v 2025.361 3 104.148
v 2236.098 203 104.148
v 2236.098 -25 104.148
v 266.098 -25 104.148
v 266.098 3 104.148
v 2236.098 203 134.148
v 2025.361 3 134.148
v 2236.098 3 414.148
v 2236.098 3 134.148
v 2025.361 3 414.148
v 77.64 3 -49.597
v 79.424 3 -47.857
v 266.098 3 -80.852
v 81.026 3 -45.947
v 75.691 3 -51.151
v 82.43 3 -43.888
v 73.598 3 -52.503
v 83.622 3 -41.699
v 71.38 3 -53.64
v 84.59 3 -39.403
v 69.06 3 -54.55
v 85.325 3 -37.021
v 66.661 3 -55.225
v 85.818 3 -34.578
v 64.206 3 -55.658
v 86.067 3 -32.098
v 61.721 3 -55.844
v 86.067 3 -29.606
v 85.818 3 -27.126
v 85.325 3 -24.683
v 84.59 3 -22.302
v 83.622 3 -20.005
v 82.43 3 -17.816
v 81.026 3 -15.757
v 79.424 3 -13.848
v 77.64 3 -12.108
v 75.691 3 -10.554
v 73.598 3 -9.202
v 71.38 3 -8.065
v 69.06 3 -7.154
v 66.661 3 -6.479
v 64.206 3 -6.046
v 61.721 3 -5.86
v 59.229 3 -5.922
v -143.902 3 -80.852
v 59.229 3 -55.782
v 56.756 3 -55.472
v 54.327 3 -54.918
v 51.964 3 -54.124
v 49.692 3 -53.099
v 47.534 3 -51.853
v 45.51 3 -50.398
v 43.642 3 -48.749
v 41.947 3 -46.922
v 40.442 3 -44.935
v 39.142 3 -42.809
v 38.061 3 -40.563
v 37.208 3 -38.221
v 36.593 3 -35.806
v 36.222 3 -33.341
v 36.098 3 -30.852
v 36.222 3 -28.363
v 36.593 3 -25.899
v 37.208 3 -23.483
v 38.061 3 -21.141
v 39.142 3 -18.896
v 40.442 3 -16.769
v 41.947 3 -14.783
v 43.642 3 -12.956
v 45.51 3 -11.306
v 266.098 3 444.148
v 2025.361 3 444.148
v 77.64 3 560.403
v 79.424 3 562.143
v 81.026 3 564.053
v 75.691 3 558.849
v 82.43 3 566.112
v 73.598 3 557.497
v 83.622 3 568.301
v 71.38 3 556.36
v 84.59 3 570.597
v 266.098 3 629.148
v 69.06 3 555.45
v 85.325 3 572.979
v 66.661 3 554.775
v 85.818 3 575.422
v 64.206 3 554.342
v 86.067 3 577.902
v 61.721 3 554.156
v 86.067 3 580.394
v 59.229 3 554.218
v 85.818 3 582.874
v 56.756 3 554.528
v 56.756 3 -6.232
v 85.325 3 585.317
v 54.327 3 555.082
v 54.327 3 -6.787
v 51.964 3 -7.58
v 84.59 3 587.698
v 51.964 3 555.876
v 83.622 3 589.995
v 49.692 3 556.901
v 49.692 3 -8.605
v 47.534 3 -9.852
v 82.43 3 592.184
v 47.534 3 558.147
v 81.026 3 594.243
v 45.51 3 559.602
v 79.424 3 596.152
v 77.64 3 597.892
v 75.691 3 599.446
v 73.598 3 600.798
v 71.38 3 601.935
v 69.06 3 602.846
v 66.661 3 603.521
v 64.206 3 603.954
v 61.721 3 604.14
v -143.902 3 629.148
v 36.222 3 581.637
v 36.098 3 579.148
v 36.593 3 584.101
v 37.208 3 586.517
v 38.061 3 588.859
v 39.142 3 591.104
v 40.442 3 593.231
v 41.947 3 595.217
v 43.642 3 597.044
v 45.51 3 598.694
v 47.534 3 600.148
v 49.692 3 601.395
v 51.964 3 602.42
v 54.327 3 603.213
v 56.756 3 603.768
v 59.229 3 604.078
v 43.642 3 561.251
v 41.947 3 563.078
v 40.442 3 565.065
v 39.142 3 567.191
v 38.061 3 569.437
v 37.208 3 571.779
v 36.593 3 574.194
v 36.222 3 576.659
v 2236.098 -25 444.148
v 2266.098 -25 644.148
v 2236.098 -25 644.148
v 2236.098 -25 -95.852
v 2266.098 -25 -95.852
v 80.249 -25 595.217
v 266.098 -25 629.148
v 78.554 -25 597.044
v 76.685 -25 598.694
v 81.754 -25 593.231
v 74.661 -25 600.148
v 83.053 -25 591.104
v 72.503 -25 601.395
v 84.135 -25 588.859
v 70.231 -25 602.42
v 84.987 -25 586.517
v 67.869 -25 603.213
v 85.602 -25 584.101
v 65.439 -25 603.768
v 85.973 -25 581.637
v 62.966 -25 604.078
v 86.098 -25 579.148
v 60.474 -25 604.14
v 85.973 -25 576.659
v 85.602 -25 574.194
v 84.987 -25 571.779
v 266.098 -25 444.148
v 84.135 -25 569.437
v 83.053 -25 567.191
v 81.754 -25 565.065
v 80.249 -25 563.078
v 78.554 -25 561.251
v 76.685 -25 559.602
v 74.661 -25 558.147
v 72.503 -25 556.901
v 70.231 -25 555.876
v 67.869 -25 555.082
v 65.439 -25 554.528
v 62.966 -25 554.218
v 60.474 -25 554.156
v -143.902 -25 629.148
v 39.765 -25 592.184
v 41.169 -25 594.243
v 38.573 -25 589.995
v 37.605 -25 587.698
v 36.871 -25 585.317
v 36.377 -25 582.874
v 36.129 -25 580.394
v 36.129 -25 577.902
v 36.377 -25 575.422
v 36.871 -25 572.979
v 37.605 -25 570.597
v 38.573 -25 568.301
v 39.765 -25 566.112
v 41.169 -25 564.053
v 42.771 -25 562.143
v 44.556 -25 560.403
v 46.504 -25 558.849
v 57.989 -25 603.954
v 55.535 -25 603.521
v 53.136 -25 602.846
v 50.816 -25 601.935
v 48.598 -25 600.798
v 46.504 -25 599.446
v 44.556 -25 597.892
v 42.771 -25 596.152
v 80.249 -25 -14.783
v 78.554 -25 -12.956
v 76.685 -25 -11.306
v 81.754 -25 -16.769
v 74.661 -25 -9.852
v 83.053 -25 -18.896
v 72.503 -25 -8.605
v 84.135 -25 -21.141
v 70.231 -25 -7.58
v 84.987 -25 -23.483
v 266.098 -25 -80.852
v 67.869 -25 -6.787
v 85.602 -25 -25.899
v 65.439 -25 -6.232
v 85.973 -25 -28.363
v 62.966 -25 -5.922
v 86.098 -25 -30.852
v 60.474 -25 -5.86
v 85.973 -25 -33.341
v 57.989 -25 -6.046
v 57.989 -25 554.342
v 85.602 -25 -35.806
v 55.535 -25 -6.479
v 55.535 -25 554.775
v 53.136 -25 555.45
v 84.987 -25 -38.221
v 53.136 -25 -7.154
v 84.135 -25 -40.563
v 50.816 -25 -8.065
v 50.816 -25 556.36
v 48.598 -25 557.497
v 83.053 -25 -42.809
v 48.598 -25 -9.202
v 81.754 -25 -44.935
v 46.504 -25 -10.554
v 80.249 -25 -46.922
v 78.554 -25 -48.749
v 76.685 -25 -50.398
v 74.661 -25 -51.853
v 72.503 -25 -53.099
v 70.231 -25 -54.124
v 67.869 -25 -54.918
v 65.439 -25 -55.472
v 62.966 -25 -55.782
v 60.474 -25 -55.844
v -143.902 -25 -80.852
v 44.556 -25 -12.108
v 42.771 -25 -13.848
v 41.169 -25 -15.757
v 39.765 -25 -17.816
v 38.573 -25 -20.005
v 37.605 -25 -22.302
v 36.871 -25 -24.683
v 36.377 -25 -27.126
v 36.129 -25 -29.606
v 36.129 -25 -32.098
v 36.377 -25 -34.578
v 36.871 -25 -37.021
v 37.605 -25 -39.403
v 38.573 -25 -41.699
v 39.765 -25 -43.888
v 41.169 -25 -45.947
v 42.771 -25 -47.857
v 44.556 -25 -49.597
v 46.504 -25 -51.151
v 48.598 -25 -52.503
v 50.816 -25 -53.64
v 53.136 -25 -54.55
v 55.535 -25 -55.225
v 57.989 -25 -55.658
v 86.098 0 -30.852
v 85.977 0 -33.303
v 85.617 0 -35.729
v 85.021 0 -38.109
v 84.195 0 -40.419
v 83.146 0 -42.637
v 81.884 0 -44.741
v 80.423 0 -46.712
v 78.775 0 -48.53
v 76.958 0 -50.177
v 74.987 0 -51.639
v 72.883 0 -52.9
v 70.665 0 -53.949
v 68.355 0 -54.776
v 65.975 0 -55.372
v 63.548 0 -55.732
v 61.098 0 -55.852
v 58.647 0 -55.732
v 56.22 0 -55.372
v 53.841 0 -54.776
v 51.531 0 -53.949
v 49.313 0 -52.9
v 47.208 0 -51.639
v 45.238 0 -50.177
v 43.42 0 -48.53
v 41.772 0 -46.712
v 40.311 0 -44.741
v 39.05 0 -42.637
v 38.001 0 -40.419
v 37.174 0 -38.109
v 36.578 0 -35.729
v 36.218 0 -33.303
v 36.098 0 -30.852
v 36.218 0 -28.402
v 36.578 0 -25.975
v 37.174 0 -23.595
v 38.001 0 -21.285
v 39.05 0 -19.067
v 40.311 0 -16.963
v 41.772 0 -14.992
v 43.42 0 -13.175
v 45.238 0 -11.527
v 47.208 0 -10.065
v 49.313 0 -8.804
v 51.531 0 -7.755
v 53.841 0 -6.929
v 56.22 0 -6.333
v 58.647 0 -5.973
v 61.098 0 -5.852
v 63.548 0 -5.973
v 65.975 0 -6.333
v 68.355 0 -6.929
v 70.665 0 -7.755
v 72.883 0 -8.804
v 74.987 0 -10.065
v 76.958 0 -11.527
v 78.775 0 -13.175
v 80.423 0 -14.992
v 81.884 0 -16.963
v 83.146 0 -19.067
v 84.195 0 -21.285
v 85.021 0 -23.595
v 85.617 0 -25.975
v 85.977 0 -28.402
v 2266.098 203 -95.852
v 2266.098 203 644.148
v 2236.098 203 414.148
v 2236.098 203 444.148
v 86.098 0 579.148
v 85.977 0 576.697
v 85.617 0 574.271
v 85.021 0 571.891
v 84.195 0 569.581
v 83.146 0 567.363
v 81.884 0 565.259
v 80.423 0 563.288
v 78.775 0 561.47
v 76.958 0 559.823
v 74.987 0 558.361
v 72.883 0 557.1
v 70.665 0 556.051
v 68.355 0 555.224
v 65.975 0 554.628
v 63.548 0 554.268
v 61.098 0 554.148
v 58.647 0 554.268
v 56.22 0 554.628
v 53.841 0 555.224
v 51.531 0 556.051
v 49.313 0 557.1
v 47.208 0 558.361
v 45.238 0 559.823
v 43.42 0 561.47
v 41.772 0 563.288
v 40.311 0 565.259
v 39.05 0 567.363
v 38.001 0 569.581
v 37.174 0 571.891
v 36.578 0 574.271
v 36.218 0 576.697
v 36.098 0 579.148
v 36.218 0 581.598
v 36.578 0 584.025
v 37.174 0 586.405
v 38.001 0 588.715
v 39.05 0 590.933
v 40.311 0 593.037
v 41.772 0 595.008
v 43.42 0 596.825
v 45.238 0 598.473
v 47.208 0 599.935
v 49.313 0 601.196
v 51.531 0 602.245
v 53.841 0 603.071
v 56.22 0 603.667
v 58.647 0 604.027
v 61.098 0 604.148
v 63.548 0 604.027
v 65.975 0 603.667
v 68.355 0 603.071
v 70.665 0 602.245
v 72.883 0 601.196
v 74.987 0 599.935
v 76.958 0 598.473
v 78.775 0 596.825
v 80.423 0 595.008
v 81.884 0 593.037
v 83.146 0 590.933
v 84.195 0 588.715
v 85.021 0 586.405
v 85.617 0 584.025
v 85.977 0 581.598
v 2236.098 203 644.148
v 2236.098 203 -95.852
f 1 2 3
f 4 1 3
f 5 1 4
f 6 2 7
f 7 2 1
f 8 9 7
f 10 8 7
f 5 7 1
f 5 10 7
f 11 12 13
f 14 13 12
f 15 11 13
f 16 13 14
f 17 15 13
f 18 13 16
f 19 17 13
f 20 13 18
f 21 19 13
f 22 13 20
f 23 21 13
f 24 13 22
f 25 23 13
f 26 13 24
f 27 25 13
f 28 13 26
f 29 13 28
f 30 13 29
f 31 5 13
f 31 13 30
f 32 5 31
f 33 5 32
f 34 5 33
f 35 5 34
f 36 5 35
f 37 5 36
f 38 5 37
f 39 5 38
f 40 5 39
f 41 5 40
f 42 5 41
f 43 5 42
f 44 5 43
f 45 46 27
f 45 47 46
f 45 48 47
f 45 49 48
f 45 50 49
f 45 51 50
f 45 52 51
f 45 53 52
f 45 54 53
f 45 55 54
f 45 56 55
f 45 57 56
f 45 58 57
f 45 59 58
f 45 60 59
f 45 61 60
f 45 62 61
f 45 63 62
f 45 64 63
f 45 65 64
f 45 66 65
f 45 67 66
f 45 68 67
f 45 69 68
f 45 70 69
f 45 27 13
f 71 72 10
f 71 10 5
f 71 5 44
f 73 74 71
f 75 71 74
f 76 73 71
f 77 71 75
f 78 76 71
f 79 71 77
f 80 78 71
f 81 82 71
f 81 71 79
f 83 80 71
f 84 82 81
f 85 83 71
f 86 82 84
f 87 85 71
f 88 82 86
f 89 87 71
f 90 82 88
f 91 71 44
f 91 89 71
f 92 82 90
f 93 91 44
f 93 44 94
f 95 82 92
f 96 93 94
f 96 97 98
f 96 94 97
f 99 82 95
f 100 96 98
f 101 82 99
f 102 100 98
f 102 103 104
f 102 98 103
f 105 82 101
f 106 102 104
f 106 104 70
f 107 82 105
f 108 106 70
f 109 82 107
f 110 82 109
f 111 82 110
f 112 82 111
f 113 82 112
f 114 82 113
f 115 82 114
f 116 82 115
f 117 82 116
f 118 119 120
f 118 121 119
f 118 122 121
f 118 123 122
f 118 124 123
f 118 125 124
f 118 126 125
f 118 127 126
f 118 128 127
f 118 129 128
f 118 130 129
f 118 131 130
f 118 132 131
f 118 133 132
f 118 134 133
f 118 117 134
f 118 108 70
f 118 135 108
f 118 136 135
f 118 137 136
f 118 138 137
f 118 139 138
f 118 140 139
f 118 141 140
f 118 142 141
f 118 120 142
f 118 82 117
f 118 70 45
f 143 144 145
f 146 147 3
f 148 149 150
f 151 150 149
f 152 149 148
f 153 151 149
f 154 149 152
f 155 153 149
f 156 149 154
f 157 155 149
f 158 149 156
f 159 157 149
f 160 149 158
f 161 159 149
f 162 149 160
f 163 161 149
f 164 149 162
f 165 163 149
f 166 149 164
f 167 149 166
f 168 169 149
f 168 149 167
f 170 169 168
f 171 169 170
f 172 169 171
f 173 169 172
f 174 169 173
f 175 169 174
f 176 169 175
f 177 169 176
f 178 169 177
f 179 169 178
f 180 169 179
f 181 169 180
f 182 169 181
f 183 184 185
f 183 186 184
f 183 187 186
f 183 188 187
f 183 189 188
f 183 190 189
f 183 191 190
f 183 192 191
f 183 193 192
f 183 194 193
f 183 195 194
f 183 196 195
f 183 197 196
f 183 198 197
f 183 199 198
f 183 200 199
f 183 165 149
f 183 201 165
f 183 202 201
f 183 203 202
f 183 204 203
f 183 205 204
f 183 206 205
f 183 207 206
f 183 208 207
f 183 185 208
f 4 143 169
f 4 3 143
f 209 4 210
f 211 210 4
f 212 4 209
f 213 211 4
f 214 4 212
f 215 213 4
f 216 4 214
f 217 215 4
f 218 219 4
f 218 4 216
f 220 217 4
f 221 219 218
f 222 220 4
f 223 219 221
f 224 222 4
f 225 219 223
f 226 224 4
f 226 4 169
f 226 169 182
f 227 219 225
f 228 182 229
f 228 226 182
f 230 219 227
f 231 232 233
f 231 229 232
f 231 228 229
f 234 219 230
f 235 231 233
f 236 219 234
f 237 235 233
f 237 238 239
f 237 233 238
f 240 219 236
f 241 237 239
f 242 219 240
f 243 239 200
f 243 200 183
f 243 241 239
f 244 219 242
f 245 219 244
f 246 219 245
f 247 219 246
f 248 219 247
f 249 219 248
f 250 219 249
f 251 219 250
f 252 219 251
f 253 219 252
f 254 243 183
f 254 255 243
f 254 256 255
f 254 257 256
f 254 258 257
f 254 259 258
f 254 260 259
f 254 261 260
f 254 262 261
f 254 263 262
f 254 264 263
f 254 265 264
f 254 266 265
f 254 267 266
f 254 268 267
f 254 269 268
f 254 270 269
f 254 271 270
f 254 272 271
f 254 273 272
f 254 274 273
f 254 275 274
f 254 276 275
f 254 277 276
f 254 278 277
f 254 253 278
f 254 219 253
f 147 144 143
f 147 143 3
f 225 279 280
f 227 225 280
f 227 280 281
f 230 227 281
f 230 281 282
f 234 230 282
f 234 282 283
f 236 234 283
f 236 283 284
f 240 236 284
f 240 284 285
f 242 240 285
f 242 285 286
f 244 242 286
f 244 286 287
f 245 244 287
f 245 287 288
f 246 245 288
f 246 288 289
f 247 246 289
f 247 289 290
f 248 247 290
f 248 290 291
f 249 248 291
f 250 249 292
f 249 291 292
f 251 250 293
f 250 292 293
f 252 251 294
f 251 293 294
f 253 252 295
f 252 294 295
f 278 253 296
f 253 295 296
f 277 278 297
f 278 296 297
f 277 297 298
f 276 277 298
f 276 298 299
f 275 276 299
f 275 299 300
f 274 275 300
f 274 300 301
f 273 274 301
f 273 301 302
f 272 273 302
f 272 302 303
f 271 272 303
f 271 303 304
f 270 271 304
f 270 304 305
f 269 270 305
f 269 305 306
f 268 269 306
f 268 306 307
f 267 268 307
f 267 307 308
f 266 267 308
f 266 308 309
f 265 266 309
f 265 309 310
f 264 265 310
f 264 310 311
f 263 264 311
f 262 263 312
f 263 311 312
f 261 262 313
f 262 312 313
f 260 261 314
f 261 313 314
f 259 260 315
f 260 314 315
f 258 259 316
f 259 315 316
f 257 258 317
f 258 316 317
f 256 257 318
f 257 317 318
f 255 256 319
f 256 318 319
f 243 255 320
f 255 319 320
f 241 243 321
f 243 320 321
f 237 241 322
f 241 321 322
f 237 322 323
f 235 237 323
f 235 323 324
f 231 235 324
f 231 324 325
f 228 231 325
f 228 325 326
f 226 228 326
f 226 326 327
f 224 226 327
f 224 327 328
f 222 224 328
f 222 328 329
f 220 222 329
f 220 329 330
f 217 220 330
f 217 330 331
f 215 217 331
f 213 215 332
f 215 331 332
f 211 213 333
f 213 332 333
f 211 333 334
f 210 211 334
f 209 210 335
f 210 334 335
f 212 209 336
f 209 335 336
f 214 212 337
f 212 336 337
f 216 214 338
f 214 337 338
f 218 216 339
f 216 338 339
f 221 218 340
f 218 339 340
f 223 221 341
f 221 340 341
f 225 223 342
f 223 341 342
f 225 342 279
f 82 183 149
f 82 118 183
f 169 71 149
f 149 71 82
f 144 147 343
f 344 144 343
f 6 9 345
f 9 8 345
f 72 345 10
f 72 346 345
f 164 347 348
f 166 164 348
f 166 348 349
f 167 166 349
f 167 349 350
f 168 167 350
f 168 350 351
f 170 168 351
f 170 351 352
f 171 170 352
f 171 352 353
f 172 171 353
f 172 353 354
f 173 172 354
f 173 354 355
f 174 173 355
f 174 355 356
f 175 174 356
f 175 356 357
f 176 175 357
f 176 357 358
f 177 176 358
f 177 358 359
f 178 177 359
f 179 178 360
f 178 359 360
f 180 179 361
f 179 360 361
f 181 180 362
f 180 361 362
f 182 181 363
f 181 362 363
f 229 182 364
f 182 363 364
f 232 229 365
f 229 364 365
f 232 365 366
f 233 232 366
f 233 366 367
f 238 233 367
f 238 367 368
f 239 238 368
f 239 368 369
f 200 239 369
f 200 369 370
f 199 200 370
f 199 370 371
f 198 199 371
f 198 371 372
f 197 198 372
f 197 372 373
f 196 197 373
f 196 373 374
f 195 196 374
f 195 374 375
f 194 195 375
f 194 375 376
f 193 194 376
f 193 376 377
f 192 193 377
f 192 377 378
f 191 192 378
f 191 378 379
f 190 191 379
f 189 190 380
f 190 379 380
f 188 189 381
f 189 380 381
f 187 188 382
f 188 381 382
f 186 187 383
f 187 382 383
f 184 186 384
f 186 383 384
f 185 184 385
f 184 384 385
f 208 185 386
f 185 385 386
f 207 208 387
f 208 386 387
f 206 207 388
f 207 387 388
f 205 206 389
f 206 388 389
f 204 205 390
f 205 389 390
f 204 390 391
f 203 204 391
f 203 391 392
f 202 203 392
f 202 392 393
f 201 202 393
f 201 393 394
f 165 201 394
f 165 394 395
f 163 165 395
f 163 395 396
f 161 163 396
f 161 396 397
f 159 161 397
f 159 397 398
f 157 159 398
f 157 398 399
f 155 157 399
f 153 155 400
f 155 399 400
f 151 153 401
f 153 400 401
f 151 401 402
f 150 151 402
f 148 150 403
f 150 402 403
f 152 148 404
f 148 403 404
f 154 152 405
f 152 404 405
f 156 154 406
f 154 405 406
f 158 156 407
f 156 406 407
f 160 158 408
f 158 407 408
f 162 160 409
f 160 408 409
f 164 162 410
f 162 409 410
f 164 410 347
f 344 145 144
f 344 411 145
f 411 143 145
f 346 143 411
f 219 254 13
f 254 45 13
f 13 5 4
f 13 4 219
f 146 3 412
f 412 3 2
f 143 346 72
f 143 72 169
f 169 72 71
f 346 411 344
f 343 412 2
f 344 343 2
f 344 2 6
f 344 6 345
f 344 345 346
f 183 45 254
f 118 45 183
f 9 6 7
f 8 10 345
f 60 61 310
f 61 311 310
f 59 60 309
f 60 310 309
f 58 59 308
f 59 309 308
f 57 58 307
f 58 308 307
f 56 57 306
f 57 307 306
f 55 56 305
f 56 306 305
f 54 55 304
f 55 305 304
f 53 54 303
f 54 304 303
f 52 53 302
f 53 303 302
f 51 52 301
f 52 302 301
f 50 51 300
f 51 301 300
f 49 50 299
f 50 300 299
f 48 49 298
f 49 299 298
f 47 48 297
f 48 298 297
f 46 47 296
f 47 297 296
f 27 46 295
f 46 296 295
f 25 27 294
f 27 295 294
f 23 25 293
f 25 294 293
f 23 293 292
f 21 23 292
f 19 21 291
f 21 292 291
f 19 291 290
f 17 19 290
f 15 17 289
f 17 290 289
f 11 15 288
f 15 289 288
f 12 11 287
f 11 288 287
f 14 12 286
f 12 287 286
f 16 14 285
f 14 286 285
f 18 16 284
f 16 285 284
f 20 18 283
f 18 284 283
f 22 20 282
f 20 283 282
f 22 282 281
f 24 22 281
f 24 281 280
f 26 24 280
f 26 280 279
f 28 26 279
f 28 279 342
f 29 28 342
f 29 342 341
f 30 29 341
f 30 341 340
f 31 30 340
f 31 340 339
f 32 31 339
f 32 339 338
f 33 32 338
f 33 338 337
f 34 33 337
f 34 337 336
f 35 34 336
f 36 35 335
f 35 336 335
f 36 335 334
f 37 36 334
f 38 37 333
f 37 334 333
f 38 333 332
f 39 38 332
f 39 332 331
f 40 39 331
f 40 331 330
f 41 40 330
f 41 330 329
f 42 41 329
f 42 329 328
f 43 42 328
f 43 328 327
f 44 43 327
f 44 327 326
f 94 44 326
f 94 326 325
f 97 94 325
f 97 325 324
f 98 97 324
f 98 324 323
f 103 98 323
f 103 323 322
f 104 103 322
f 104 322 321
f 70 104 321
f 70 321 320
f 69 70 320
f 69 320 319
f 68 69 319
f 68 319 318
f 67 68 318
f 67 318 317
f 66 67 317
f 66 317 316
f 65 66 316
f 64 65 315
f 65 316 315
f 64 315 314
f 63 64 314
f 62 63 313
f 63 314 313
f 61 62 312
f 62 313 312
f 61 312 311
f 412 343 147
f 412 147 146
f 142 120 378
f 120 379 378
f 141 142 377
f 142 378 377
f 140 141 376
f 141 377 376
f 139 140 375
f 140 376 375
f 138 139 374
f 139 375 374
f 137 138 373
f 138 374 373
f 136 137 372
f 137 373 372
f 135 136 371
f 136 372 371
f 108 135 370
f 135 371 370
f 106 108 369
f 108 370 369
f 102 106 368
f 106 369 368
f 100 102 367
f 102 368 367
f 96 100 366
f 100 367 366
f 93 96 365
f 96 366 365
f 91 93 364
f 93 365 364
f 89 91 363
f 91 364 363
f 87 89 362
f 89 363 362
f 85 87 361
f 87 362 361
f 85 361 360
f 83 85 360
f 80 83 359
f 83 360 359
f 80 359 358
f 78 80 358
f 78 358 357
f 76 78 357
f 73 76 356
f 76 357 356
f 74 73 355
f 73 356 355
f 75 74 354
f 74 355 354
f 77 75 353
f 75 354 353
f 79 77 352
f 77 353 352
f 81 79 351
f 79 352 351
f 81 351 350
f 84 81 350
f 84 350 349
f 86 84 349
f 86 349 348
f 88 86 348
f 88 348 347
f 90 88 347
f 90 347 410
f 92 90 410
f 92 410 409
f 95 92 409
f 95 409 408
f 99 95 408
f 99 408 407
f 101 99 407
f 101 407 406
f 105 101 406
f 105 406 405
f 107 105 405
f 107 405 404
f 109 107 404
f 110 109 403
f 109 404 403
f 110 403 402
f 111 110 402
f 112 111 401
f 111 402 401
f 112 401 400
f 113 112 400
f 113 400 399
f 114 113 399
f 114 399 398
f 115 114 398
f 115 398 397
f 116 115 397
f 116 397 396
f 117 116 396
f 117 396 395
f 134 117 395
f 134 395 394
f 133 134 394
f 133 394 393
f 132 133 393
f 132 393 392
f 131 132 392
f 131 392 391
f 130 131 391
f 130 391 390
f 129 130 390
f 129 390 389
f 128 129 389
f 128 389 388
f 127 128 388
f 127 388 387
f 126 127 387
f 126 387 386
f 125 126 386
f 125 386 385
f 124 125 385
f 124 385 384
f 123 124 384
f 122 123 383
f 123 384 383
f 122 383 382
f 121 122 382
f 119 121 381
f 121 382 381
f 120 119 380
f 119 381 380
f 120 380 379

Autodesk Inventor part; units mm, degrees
ref_plane "YZ Plane" through (0, 0, 0) normal (1, 0, 0) x (0, 1, 0)
ref_plane "XZ Plane" through (0, 0, 0) normal (0, 1, 0) x (-1, 0, 0)
ref_plane "XY Plane" through (0, 0, 0) normal (0, 0, 1) x (1, 0, 0)
sketch "Sketch1" plane through (0, 0, 0) normal (0, 1, 0) x (-1, 0, 0)
  line L0 (-266.0977, 629.1478) -> (143.9023, 629.1478)
  line L1 (143.9023, 629.1478) -> (143.9023, -80.8522)
  line L2 (143.9023, -80.8522) -> (-266.0977, -80.8522)
  line L3 (-266.0977, -80.8522) -> (-266.0977, 629.1478)
  circle A0 centre (-61.0977, 579.1478) radius 25
  circle A1 centre (-61.0977, -30.8522) radius 25
  point P0 (0, 0)
  dimension "d0" = 710
  dimension "d1" = 410
  dimension "d4" = 50
  dimension "d5" = 50
extrude "Extrusion1" add sketch "Sketch1" along normal blind 3
sketch "Sketch2" plane through (266.0977, 0, 629.1478) normal (1, 0, 0) x (0, 0, -1)
  line L0 (710, 3) -> (0, 3) projected
  line L1 (710, 3) -> (0, 3)
  line L2 (0, 3) -> (0, 0)
  line L3 (0, 0) -> (710, 0)
  line L4 (710, 0) -> (710, 3)
  line L5 (355, 0) -> (525, 0)
  line L6 (710, 0) -> (0, 0) projected
  line L7 (355, 3) -> (185, 3)
  line L8 (185, 3) -> (525, 3)
  line L9 (525, 3) -> (525, 0)
  line L10 (525, 0) -> (185, 0)
  line L11 (185, 0) -> (185, 3)
  point P0 (629.1478, 0)
  dimension "d8" = 170
  dimension "d9" = 170
extrude "Extrusion2" add sketch "Sketch2" along normal blind 2000 contours L9 L3 L11 L0
sketch "Sketch3" plane through (0, 3, 0) normal (0, 1, 0) x (1, 0, 0)
  line L0 (2266.0977, -104.1478) -> (2266.0977, -444.1478) projected
  line L1 (266.0977, -104.1478) -> (2266.0977, -104.1478) projected
  line L2 (2266.0977, -444.1478) -> (2236.0977, -444.1478)
  line L3 (2236.0977, -444.1478) -> (2236.0977, -104.1478)
  line L4 (2236.0977, -104.1478) -> (2266.0977, -104.1478)
  line L5 (2266.0977, -104.1478) -> (2266.0977, -444.1478)
  point P0 (0, 0)
  dimension "d12" = 340
  dimension "d13" = 30
extrude "Extrusion3" add sketch "Sketch3" along normal blind 200
sketch "Sketch4" plane through (266.0977, 0, 444.1478) normal (0, 0, 1) x (1, 0, 0)
  line L0 (1970, 3) -> (1970, 203) projected
  line L1 (1970, 203) -> (1970, 2.607)
  line L2 (0, 0) -> (2000, 0) projected
  line L3 (1970, 203) -> (1758.8495, 2.607)
  line L4 (1758.8495, 2.607) -> (1970, 2.607)
  line L5 (1970, 203) -> (1970, 2.607)
  point P0 (-266.0977, 0)
extrude "Extrusion4" add sketch "Sketch4" against normal blind 30
sketch "Sketch5" plane through (0, 3, 0) normal (0, 1, 0) x (1, 0, 0)
  line L0 (266.0977, 80.8522) -> (-143.9023, 80.8522) projected
  line L1 (-143.9023, 80.8522) -> (2266.0977, 80.8522)
  line L2 (-143.9023, 80.8522) -> (-143.9023, -629.1478) projected
  line L3 (-143.9023, 80.8522) -> (-143.9023, -629.1478)
  point P0 (0, 0)
  dimension "d18" = 2410
  dimension "d19" = 710
sketch "Sketch6" plane through (0, 0, 0) normal (0, -1, 0) x (1, 0, 0)
  line L0 (266.0977, 104.1478) -> (2266.0977, 104.1478) projected
  line L1 (2266.0977, 444.1478) -> (2266.0977, 104.1478) projected
  line L2 (2266.0977, 104.1478) -> (2266.0977, 444.1478)
  line L3 (2266.0977, 444.1478) -> (266.0977, 444.1478)
  line L4 (-143.9023, 629.1478) -> (266.0977, 629.1478) projected
  line L5 (266.0977, 444.1478) -> (266.0977, 629.1478)
  line L6 (266.0977, 629.1478) -> (-143.9023, 629.1478)
  line L7 (-143.9023, -80.8522) -> (-143.9023, 629.1478) projected
  line L8 (-143.9023, 629.1478) -> (-143.9023, -80.8522)
  line L9 (-143.9023, -80.8522) -> (266.0977, -80.8522)
  line L10 (266.0977, 104.1478) -> (266.0977, -80.8522) projected
  line L11 (266.0977, -80.8522) -> (266.0977, 104.1478)
  line L12 (266.0977, 104.1478) -> (2266.0977, 104.1478)
  circle A0 centre (61.0977, -30.8522) radius 25 projected
  circle A1 centre (61.0977, -30.8522) radius 25
  circle A2 centre (61.0977, 579.1478) radius 25 projected
  circle A3 centre (61.0977, 579.1478) radius 25
  point P0 (0, 0)
extrude "Extrusion5" add sketch "Sketch6" along normal blind 25
sketch "Sketch7" plane through (2236.0977, 3, 104.1478) normal (0, 0, -1) x (-1, 0, 0)
  line L0 (0, 0) -> (0, 200) projected
  line L1 (1970, -28) -> (-30, -28) projected
  line L2 (0, 200) -> (-30, 200)
  line L3 (-30, 200) -> (-30, -28)
  line L4 (-30, -28) -> (0, -28)
  line L5 (0, -28) -> (0, 200)
  point P0 (2236.0977, -3)
  point P1 (0, -28)
extrude "Extrusion6" add sketch "Sketch7" along normal blind 200
sketch "Sketch8" plane through (266.0977, 3, 444.1478) normal (0, 0, 1) x (1, 0, 0)
  line L0 (2000, -28) -> (2000, 200) projected
  line L1 (1970, 200) -> (2000, 200) projected
  line L2 (2000, -28) -> (1970, -28)
  line L3 (1970, -28) -> (1970, 200)
  line L4 (1970, 200) -> (2000, 200)
  line L5 (2000, 200) -> (2000, -28)
  point P0 (-266.0977, -3)
extrude "Extrusion7" add sketch "Sketch8" along normal blind 200
sketch "Sketch9" plane through (2236.0977, 3, 104.1478) normal (0, 0, -1) x (-1, 0, 0)
  line L0 (0, 200) -> (0, -28) projected
  line L1 (0, 0) -> (0, 200)
  line L2 (1970, 0) -> (210.7363, 0) projected
  line L3 (0, 200) -> (210.7363, 0)
  line L4 (210.7363, 0) -> (0, 0)
  point P0 (2236.0977, -3)
extrude "Extrusion8" add sketch "Sketch9" against normal blind 30
properties part number "soporte"
